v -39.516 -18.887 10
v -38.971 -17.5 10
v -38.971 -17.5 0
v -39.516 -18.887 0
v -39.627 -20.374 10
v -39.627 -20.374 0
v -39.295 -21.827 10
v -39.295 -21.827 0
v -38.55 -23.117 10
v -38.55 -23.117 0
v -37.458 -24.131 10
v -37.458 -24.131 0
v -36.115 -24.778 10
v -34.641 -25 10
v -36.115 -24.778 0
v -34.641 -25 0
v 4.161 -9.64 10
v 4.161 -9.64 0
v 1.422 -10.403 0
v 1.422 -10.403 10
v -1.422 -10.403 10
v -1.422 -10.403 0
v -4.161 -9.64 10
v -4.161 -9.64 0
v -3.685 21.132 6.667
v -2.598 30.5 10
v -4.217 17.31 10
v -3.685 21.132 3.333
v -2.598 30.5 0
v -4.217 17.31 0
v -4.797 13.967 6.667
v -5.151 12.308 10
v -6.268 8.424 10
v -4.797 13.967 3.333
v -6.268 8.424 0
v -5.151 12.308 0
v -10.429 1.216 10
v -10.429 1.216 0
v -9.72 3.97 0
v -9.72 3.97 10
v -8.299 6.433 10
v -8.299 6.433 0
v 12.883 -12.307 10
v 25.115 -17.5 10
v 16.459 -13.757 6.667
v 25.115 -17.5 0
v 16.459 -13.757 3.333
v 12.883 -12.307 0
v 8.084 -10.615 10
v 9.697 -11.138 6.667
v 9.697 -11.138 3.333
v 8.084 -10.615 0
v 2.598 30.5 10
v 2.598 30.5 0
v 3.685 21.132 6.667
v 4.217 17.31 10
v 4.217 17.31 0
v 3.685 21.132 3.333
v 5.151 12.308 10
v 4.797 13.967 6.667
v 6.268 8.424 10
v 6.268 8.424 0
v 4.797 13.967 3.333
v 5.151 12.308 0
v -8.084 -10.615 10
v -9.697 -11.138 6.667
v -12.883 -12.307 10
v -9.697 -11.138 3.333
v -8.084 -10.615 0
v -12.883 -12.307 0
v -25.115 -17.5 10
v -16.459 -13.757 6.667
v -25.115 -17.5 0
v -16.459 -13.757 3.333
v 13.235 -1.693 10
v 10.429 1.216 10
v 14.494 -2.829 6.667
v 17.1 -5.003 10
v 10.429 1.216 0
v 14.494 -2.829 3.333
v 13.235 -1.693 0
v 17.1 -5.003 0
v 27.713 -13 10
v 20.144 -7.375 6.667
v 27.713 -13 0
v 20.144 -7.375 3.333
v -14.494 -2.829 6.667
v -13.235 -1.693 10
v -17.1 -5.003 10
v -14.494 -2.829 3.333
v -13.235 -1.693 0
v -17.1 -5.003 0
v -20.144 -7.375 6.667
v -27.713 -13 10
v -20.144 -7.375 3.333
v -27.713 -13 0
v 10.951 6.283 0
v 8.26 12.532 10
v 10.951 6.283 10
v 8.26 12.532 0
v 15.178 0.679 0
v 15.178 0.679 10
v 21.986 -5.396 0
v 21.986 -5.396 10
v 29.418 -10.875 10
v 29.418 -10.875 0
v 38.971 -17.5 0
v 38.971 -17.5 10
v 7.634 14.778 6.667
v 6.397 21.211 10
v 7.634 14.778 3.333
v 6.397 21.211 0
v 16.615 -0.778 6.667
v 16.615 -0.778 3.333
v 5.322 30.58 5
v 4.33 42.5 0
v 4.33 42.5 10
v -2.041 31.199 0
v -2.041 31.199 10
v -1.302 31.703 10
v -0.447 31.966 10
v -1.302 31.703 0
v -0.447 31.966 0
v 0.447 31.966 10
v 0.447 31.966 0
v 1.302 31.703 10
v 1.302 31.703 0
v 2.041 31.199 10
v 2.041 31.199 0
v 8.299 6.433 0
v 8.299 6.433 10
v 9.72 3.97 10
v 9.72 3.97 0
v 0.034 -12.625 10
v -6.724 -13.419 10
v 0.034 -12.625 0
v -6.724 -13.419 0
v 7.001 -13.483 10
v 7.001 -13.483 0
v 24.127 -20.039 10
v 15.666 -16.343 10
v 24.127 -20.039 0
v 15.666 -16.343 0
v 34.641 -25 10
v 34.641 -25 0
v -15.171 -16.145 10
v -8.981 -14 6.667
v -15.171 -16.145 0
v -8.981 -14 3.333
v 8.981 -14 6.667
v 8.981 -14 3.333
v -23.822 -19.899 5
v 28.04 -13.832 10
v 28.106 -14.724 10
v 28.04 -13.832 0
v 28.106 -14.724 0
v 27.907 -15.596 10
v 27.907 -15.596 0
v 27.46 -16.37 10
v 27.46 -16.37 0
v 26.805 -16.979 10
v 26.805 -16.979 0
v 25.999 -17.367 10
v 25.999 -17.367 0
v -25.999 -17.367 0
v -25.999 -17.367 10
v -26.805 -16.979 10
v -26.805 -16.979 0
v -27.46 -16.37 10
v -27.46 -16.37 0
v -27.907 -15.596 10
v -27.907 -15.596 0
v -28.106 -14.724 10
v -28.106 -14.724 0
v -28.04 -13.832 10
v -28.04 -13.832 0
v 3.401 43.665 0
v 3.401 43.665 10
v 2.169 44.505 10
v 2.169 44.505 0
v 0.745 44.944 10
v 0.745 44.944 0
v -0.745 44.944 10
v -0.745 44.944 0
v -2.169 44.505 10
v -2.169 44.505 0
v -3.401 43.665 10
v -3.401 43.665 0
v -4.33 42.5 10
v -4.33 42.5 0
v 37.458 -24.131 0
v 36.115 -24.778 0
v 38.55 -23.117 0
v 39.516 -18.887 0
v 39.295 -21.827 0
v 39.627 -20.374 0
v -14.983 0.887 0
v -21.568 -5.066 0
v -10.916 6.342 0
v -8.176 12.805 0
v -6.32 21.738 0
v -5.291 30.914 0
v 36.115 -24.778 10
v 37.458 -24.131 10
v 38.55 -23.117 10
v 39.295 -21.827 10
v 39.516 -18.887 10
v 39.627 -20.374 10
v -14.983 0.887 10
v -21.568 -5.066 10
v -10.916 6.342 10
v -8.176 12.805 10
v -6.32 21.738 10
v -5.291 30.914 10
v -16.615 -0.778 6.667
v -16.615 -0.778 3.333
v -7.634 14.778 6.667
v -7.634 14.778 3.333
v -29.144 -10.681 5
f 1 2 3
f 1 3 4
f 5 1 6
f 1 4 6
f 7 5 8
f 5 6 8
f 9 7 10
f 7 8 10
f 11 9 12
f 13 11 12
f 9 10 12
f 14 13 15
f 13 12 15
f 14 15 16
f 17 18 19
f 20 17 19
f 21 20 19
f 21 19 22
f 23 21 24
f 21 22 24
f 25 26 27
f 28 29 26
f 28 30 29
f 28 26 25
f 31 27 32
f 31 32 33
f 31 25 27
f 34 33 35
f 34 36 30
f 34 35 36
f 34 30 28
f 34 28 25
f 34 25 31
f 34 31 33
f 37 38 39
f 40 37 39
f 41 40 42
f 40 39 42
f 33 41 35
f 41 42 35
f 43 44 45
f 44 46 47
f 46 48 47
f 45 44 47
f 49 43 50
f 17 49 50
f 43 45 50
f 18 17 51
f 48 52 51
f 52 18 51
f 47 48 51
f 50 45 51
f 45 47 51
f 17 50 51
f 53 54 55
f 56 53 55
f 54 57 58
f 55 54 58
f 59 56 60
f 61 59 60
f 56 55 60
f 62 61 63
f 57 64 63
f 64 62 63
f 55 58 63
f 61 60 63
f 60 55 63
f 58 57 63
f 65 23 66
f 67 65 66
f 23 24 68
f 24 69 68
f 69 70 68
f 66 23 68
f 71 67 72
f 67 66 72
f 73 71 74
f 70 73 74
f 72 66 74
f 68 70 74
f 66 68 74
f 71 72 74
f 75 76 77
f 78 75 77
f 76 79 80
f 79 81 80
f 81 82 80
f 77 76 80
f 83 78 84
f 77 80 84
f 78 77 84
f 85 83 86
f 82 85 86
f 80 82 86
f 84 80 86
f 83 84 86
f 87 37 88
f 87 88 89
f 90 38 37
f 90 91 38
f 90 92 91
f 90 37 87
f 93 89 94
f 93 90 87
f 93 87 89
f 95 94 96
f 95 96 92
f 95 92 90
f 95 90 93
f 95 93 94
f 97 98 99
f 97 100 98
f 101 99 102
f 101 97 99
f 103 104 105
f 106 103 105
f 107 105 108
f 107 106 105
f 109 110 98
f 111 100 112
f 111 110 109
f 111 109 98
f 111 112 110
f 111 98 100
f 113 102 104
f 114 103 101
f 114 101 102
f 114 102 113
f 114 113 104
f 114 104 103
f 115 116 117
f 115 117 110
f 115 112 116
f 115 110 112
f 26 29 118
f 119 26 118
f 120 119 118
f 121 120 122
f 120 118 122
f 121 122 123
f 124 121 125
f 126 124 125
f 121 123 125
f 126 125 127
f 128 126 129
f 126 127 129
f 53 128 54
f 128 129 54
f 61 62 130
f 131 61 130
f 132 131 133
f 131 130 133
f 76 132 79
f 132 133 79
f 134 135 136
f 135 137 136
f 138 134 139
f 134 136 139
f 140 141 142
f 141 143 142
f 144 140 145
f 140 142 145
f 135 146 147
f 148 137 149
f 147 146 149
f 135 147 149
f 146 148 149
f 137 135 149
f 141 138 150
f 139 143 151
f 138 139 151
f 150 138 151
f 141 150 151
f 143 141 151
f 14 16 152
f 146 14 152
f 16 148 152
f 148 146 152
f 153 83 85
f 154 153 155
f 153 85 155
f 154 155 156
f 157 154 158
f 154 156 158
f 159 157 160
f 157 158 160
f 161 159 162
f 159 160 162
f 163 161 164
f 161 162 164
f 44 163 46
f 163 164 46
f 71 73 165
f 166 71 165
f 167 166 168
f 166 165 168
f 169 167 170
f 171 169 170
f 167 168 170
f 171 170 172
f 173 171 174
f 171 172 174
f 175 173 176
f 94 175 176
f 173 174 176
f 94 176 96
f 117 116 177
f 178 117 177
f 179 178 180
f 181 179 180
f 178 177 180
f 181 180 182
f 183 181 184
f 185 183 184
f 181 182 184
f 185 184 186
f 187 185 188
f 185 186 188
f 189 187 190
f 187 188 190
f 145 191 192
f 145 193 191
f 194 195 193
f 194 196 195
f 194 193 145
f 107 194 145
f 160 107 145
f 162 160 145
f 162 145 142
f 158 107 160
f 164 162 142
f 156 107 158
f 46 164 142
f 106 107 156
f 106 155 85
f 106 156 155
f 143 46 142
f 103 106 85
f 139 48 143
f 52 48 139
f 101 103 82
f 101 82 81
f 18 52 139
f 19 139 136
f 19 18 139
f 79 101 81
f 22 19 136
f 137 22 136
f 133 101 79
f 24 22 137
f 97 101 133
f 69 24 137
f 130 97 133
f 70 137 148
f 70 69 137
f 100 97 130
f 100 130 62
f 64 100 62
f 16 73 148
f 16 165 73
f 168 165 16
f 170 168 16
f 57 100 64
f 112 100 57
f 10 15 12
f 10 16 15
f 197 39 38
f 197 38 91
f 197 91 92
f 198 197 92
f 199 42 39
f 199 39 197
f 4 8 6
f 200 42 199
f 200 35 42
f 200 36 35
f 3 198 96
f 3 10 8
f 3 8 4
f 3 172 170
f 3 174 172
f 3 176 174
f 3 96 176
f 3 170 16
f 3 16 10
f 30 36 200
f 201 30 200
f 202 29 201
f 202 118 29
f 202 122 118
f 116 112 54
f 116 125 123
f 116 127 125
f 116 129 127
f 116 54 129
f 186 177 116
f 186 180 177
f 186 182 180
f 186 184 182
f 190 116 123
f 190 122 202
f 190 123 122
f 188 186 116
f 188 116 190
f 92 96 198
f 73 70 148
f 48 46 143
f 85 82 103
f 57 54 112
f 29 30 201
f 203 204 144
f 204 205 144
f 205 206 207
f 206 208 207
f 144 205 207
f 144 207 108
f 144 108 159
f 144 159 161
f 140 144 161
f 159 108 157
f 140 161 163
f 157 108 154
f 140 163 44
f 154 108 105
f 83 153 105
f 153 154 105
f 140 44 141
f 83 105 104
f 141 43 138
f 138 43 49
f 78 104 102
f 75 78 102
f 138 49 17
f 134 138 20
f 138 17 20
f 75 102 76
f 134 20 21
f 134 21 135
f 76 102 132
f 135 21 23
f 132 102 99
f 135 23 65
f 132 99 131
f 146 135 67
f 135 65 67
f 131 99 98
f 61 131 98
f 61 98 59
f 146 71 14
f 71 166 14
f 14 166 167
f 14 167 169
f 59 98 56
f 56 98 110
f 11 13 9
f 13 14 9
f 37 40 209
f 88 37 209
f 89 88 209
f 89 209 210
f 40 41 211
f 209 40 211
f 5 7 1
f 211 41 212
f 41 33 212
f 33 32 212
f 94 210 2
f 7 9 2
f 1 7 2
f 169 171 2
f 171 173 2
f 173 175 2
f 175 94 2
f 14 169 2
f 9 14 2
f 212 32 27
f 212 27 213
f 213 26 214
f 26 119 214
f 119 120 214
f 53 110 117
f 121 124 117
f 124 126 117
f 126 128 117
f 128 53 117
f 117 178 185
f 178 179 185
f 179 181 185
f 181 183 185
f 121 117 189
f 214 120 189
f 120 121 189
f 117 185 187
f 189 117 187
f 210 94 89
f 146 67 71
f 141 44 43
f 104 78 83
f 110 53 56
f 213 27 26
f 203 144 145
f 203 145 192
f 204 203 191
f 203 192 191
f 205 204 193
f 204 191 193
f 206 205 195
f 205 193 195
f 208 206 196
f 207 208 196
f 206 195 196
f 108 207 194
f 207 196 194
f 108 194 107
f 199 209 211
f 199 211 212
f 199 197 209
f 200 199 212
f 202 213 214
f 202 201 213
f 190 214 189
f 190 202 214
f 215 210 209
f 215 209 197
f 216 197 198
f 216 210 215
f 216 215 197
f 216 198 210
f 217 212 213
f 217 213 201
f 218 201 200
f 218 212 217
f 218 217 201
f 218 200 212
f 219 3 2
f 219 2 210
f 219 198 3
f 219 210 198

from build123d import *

# Parameters (mm, degrees)
F1_DEPTH = 10


with BuildPart() as f1:
    # F0 (on Top) → F1 (new body)
    with BuildSketch(Plane.XY):
        with BuildLine():
            add(Edge.make_bspline(
                [(4.330127, 42.5), (7.361216, 4.25), (7.361216, 4.25), (38.971143, -17.5)],
                knots=[0, 0, 0, 0, 69.282032, 69.282032, 69.282032, 69.282032], degree=3))
            ThreePointArc((4.330127, 42.5), (0, 45), (-4.330127, 42.5))
            add(Edge.make_bspline(
                [(-38.971143, -17.5), (-7.361216, 4.25), (-7.361216, 4.25), (-4.330127, 42.5)],
                knots=[0, 0, 0, 0, 69.282032, 69.282032, 69.282032, 69.282032], degree=3))
            ThreePointArc((-38.971143, -17.5), (-38.971143, -22.5), (-34.641016, -25))
            add(Edge.make_bspline(
                [(-34.641016, -25), (0, -8.5), (0, -8.5), (34.641016, -25)],
                knots=[0, 0, 0, 0, 69.282032, 69.282032, 69.282032, 69.282032], degree=3))
            ThreePointArc((34.641016, -25), (38.971143, -22.5), (38.971143, -17.5))
        make_face()
        with BuildLine():
            ThreePointArc((-10.429305, 1.216389), (-9.093267, 5.25), (-6.268076, 8.423848))
            add(Edge.make_bspline(
                [(-2.598076, 30.5), (-3.784006, 19.838289), (-4.505935, 13.348031), (-6.268076, 8.423848)],
                knots=[0, 0, 0, 0, 19.652555, 19.652555, 19.652555, 19.652555], degree=3))
            ThreePointArc((-2.598076, 30.5), (0, 32), (2.598076, 30.5))
            add(Edge.make_bspline(
                [(2.598076, 30.5), (3.784006, 19.838289), (4.505935, 13.34803), (6.268076, 8.423848)],
                knots=[0, 0, 0, 0, 19.652555, 19.652555, 19.652555, 19.652555], degree=3))
            ThreePointArc((6.268076, 8.423848), (9.093267, 5.25), (10.429305, 1.216389))
            add(Edge.make_bspline(
                [(10.429305, 1.216389), (13.812701, -2.771761), (19.072465, -6.642099), (27.712813, -13)],
                knots=[30.576918, 30.576918, 30.576918, 30.576918, 50.229473, 50.229473, 50.229473, 50.229473], degree=3))
            ThreePointArc((27.712813, -13), (27.712813, -16), (25.114737, -17.5))
            add(Edge.make_bspline(
                [(25.114737, -17.5), (15.288459, -13.19619), (9.306766, -10.576269), (4.161228, -9.640237)],
                knots=[0, 0, 0, 0, 19.652555, 19.652555, 19.652555, 19.652555], degree=3))
            ThreePointArc((4.161228, -9.640237), (0, -10.5), (-4.161228, -9.640237))
            add(Edge.make_bspline(
                [(-4.161228, -9.640237), (-9.306766, -10.576269), (-15.288459, -13.19619), (-25.114737, -17.5)],
                knots=[30.576918, 30.576918, 30.576918, 30.576918, 50.229473, 50.229473, 50.229473, 50.229473], degree=3))
            ThreePointArc((-25.114737, -17.5), (-27.712813, -16), (-27.712813, -13))
            add(Edge.make_bspline(
                [(-10.429305, 1.216389), (-13.812701, -2.771761), (-19.072465, -6.642099), (-27.712813, -13)],
                knots=[30.576918, 30.576918, 30.576918, 30.576918, 50.229473, 50.229473, 50.229473, 50.229473], degree=3))
        make_face(mode=Mode.SUBTRACT)
    extrude(amount=F1_DEPTH)


solid = f1.part
